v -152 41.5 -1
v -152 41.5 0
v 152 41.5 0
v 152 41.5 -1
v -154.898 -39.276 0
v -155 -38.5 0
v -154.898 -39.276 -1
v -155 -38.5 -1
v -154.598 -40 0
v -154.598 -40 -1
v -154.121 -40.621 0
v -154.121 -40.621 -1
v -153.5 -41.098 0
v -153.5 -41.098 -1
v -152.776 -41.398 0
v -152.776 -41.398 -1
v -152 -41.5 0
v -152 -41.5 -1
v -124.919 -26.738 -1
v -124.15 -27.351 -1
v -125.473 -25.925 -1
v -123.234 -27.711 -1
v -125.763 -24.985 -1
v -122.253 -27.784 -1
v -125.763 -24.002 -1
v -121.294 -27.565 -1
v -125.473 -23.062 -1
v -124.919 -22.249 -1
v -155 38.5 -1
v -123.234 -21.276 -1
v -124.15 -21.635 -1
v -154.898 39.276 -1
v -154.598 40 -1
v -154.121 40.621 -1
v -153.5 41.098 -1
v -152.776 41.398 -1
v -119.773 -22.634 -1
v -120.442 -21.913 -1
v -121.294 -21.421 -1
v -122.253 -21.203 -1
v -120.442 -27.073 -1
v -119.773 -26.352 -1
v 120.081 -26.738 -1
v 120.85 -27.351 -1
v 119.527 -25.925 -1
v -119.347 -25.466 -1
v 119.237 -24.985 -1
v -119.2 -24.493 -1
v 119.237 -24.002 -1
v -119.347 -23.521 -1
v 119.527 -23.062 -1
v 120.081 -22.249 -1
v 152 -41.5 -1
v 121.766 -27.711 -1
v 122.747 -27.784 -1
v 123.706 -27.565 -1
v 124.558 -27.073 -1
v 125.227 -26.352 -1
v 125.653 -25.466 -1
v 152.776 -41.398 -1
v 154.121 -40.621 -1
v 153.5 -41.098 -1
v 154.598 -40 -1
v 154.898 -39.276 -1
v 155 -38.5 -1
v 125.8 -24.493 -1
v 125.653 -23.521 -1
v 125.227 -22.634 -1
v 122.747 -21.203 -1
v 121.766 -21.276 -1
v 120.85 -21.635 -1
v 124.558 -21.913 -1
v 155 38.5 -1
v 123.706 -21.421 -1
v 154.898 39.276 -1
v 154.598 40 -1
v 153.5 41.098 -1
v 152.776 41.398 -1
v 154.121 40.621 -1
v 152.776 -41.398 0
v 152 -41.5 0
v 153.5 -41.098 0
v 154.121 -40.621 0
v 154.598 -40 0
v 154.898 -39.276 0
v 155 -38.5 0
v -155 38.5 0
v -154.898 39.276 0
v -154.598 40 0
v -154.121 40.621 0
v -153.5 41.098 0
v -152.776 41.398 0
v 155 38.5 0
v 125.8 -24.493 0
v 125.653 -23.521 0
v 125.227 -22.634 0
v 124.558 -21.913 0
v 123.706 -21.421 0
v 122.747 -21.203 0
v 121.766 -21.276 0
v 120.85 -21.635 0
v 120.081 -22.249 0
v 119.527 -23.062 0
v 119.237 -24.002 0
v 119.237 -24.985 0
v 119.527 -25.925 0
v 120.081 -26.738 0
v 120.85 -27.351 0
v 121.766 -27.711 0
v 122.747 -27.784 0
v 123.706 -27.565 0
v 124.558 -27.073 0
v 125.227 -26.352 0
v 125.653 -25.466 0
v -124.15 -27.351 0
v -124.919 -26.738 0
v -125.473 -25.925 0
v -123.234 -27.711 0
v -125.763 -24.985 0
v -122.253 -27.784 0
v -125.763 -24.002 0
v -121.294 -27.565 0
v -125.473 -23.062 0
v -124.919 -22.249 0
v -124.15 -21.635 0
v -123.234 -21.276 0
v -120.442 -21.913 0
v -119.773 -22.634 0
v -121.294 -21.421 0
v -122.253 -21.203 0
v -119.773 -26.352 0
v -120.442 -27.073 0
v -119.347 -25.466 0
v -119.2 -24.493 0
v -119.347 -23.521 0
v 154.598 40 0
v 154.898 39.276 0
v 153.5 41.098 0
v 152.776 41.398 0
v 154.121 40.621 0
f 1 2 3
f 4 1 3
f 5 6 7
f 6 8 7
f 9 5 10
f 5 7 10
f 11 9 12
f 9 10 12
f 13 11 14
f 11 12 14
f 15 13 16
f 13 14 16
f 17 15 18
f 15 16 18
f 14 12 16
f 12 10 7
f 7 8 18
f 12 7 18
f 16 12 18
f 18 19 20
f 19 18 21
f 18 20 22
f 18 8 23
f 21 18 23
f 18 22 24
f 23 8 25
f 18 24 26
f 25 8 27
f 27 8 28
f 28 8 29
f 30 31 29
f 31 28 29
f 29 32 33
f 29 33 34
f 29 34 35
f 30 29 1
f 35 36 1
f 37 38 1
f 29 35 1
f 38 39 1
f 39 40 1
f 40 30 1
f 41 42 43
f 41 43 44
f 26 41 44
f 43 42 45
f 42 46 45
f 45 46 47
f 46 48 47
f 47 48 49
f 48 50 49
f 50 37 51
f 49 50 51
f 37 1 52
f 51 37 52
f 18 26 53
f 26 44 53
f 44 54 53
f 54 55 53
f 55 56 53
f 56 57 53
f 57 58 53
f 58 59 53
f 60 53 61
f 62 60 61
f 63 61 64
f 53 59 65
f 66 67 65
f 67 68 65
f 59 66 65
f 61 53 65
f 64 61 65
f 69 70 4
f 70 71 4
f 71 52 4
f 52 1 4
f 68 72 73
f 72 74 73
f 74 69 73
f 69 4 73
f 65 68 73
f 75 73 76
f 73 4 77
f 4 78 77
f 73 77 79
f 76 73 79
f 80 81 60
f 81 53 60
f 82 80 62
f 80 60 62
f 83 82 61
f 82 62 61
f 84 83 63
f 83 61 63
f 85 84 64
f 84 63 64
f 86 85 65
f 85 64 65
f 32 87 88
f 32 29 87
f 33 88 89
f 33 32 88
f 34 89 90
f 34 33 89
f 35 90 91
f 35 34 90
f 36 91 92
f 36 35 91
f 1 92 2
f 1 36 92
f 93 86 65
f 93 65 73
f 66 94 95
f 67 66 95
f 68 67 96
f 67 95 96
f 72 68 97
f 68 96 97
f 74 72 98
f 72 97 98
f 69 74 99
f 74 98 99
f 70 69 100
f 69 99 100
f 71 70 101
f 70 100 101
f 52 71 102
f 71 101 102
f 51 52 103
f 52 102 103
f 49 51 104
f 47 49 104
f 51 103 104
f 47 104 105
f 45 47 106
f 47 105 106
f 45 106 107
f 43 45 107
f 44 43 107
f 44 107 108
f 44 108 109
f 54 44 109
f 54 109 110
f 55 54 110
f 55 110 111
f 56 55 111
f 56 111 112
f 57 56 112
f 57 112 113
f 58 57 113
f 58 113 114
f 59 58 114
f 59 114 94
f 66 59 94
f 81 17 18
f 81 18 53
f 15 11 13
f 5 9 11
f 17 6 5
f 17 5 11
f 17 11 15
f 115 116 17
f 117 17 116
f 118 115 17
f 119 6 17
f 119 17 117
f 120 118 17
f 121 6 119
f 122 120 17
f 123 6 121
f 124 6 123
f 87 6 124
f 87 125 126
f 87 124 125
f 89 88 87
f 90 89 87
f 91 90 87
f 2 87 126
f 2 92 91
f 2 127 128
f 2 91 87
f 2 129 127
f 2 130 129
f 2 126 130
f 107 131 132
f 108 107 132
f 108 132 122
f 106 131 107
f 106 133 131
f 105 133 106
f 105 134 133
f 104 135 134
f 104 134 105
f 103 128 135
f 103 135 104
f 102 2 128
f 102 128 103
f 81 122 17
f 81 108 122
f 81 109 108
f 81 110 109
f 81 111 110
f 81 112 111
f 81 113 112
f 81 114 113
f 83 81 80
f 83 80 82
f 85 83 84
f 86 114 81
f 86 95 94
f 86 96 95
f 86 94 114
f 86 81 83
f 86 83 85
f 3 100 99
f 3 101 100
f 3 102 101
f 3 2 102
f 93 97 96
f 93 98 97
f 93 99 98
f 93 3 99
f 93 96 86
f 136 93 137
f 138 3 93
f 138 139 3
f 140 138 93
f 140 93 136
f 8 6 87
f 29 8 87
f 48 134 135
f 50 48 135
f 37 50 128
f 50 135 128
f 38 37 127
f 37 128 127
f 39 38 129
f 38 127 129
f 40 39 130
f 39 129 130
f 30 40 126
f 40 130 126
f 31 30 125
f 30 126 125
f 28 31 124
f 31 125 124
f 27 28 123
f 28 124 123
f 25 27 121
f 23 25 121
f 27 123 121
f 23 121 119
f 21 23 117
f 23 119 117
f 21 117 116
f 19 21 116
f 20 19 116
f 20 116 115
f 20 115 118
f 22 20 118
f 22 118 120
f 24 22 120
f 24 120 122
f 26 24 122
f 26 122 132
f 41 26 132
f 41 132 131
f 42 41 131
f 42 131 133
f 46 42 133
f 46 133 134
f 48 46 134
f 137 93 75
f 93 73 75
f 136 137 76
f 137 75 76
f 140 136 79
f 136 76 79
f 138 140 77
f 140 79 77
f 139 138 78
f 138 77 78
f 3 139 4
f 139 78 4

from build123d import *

# Parameters (mm, degrees)
SKETCH1_W          = 310
SKETCH1_H          = 83
BASE_FLANGE1_DEPTH = 1
FILLET1_R          = 3
SKETCH6_R          = 3.3
CUT_EXTRUDE1_DEPTH = 10


# Sheet-metal steps are written as plain solids
with BuildPart() as part:
    # Sketch1 → Base-Flange1 (new body)
    with BuildSketch(Plane.XY):
        Rectangle(SKETCH1_W, SKETCH1_H)
    extrude(amount=-BASE_FLANGE1_DEPTH)

    # Fillet1
    fillet1_edges = [part.edges().sort_by_distance(p)[0] for p in [
        (155, -41.5, -0.5),
        (-155, -41.5, -0.5),
        (-155, 41.5, -0.5),
        (155, 41.5, -0.5),
    ]]
    fillet(fillet1_edges, radius=FILLET1_R)

    # Sketch6 → Cut-Extrude1 (cut)
    with BuildSketch(Plane.XY):
        with Locations((122.5, -24.493378468)):
            Circle(SKETCH6_R)
        with Locations((-122.5, -24.493378468)):
            Circle(SKETCH6_R)
    extrude(amount=-CUT_EXTRUDE1_DEPTH, mode=Mode.SUBTRACT)


solid = part.part
